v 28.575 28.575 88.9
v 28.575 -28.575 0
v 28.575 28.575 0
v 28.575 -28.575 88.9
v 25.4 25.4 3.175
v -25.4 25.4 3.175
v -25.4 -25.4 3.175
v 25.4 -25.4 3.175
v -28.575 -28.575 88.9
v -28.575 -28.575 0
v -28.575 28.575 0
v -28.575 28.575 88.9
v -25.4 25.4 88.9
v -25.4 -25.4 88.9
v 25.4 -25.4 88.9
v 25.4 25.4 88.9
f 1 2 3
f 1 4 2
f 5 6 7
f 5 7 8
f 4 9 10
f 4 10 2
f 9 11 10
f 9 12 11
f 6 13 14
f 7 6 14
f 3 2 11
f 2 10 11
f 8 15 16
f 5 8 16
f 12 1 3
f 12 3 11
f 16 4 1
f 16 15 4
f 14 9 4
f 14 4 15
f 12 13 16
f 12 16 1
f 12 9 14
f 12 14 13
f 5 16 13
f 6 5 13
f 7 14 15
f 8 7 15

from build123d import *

# Parameters (mm, degrees)
F0_W     = 50.8
F0_H     = 50.8
F1_DEPTH = 3.175
F2_W     = 57.15
F2_H     = 88.9
F3_DEPTH = 3.175
F4_W     = 57.15
F4_H     = 88.9
F5_DEPTH = 3.175
F6_W     = 50.8
F6_H     = 88.9
F7_DEPTH = 3.175
F8_W     = 50.8
F8_H     = 88.9
F9_DEPTH = 3.175


with BuildPart() as f1:
    # F0 (on Top) → F1 (new body)
    with BuildSketch(Plane.XY):
        Rectangle(F0_W, F0_H)
    extrude(amount=F1_DEPTH)

    # F2 (on face) → F3 (join)
    with BuildSketch(Plane.XZ.offset(25.4)):
        with Locations((0, 44.45)):
            Rectangle(F2_W, F2_H)
    extrude(amount=F3_DEPTH)

    # F4 (on face) → F5 (join)
    with BuildSketch(Plane(origin=(0, 25.4, 0), x_dir=(-1, 0, 0), z_dir=(0, 1, 0))):
        with Locations((0, 44.45)):
            Rectangle(F4_W, F4_H)
    extrude(amount=F5_DEPTH)

    # F6 (on face) → F7 (join)
    with BuildSketch(Plane(origin=(-25.4, 0, 0), x_dir=(0, -1, 0), z_dir=(-1, 0, 0))):
        with Locations((0, 44.45)):
            Rectangle(F6_W, F6_H)
    extrude(amount=F7_DEPTH)

    # F8 (on face) → F9 (join)
    with BuildSketch(Plane.YZ.offset(25.4)):
        with Locations((0, 44.45)):
            Rectangle(F8_W, F8_H)
    extrude(amount=F9_DEPTH)


solid = f1.part
